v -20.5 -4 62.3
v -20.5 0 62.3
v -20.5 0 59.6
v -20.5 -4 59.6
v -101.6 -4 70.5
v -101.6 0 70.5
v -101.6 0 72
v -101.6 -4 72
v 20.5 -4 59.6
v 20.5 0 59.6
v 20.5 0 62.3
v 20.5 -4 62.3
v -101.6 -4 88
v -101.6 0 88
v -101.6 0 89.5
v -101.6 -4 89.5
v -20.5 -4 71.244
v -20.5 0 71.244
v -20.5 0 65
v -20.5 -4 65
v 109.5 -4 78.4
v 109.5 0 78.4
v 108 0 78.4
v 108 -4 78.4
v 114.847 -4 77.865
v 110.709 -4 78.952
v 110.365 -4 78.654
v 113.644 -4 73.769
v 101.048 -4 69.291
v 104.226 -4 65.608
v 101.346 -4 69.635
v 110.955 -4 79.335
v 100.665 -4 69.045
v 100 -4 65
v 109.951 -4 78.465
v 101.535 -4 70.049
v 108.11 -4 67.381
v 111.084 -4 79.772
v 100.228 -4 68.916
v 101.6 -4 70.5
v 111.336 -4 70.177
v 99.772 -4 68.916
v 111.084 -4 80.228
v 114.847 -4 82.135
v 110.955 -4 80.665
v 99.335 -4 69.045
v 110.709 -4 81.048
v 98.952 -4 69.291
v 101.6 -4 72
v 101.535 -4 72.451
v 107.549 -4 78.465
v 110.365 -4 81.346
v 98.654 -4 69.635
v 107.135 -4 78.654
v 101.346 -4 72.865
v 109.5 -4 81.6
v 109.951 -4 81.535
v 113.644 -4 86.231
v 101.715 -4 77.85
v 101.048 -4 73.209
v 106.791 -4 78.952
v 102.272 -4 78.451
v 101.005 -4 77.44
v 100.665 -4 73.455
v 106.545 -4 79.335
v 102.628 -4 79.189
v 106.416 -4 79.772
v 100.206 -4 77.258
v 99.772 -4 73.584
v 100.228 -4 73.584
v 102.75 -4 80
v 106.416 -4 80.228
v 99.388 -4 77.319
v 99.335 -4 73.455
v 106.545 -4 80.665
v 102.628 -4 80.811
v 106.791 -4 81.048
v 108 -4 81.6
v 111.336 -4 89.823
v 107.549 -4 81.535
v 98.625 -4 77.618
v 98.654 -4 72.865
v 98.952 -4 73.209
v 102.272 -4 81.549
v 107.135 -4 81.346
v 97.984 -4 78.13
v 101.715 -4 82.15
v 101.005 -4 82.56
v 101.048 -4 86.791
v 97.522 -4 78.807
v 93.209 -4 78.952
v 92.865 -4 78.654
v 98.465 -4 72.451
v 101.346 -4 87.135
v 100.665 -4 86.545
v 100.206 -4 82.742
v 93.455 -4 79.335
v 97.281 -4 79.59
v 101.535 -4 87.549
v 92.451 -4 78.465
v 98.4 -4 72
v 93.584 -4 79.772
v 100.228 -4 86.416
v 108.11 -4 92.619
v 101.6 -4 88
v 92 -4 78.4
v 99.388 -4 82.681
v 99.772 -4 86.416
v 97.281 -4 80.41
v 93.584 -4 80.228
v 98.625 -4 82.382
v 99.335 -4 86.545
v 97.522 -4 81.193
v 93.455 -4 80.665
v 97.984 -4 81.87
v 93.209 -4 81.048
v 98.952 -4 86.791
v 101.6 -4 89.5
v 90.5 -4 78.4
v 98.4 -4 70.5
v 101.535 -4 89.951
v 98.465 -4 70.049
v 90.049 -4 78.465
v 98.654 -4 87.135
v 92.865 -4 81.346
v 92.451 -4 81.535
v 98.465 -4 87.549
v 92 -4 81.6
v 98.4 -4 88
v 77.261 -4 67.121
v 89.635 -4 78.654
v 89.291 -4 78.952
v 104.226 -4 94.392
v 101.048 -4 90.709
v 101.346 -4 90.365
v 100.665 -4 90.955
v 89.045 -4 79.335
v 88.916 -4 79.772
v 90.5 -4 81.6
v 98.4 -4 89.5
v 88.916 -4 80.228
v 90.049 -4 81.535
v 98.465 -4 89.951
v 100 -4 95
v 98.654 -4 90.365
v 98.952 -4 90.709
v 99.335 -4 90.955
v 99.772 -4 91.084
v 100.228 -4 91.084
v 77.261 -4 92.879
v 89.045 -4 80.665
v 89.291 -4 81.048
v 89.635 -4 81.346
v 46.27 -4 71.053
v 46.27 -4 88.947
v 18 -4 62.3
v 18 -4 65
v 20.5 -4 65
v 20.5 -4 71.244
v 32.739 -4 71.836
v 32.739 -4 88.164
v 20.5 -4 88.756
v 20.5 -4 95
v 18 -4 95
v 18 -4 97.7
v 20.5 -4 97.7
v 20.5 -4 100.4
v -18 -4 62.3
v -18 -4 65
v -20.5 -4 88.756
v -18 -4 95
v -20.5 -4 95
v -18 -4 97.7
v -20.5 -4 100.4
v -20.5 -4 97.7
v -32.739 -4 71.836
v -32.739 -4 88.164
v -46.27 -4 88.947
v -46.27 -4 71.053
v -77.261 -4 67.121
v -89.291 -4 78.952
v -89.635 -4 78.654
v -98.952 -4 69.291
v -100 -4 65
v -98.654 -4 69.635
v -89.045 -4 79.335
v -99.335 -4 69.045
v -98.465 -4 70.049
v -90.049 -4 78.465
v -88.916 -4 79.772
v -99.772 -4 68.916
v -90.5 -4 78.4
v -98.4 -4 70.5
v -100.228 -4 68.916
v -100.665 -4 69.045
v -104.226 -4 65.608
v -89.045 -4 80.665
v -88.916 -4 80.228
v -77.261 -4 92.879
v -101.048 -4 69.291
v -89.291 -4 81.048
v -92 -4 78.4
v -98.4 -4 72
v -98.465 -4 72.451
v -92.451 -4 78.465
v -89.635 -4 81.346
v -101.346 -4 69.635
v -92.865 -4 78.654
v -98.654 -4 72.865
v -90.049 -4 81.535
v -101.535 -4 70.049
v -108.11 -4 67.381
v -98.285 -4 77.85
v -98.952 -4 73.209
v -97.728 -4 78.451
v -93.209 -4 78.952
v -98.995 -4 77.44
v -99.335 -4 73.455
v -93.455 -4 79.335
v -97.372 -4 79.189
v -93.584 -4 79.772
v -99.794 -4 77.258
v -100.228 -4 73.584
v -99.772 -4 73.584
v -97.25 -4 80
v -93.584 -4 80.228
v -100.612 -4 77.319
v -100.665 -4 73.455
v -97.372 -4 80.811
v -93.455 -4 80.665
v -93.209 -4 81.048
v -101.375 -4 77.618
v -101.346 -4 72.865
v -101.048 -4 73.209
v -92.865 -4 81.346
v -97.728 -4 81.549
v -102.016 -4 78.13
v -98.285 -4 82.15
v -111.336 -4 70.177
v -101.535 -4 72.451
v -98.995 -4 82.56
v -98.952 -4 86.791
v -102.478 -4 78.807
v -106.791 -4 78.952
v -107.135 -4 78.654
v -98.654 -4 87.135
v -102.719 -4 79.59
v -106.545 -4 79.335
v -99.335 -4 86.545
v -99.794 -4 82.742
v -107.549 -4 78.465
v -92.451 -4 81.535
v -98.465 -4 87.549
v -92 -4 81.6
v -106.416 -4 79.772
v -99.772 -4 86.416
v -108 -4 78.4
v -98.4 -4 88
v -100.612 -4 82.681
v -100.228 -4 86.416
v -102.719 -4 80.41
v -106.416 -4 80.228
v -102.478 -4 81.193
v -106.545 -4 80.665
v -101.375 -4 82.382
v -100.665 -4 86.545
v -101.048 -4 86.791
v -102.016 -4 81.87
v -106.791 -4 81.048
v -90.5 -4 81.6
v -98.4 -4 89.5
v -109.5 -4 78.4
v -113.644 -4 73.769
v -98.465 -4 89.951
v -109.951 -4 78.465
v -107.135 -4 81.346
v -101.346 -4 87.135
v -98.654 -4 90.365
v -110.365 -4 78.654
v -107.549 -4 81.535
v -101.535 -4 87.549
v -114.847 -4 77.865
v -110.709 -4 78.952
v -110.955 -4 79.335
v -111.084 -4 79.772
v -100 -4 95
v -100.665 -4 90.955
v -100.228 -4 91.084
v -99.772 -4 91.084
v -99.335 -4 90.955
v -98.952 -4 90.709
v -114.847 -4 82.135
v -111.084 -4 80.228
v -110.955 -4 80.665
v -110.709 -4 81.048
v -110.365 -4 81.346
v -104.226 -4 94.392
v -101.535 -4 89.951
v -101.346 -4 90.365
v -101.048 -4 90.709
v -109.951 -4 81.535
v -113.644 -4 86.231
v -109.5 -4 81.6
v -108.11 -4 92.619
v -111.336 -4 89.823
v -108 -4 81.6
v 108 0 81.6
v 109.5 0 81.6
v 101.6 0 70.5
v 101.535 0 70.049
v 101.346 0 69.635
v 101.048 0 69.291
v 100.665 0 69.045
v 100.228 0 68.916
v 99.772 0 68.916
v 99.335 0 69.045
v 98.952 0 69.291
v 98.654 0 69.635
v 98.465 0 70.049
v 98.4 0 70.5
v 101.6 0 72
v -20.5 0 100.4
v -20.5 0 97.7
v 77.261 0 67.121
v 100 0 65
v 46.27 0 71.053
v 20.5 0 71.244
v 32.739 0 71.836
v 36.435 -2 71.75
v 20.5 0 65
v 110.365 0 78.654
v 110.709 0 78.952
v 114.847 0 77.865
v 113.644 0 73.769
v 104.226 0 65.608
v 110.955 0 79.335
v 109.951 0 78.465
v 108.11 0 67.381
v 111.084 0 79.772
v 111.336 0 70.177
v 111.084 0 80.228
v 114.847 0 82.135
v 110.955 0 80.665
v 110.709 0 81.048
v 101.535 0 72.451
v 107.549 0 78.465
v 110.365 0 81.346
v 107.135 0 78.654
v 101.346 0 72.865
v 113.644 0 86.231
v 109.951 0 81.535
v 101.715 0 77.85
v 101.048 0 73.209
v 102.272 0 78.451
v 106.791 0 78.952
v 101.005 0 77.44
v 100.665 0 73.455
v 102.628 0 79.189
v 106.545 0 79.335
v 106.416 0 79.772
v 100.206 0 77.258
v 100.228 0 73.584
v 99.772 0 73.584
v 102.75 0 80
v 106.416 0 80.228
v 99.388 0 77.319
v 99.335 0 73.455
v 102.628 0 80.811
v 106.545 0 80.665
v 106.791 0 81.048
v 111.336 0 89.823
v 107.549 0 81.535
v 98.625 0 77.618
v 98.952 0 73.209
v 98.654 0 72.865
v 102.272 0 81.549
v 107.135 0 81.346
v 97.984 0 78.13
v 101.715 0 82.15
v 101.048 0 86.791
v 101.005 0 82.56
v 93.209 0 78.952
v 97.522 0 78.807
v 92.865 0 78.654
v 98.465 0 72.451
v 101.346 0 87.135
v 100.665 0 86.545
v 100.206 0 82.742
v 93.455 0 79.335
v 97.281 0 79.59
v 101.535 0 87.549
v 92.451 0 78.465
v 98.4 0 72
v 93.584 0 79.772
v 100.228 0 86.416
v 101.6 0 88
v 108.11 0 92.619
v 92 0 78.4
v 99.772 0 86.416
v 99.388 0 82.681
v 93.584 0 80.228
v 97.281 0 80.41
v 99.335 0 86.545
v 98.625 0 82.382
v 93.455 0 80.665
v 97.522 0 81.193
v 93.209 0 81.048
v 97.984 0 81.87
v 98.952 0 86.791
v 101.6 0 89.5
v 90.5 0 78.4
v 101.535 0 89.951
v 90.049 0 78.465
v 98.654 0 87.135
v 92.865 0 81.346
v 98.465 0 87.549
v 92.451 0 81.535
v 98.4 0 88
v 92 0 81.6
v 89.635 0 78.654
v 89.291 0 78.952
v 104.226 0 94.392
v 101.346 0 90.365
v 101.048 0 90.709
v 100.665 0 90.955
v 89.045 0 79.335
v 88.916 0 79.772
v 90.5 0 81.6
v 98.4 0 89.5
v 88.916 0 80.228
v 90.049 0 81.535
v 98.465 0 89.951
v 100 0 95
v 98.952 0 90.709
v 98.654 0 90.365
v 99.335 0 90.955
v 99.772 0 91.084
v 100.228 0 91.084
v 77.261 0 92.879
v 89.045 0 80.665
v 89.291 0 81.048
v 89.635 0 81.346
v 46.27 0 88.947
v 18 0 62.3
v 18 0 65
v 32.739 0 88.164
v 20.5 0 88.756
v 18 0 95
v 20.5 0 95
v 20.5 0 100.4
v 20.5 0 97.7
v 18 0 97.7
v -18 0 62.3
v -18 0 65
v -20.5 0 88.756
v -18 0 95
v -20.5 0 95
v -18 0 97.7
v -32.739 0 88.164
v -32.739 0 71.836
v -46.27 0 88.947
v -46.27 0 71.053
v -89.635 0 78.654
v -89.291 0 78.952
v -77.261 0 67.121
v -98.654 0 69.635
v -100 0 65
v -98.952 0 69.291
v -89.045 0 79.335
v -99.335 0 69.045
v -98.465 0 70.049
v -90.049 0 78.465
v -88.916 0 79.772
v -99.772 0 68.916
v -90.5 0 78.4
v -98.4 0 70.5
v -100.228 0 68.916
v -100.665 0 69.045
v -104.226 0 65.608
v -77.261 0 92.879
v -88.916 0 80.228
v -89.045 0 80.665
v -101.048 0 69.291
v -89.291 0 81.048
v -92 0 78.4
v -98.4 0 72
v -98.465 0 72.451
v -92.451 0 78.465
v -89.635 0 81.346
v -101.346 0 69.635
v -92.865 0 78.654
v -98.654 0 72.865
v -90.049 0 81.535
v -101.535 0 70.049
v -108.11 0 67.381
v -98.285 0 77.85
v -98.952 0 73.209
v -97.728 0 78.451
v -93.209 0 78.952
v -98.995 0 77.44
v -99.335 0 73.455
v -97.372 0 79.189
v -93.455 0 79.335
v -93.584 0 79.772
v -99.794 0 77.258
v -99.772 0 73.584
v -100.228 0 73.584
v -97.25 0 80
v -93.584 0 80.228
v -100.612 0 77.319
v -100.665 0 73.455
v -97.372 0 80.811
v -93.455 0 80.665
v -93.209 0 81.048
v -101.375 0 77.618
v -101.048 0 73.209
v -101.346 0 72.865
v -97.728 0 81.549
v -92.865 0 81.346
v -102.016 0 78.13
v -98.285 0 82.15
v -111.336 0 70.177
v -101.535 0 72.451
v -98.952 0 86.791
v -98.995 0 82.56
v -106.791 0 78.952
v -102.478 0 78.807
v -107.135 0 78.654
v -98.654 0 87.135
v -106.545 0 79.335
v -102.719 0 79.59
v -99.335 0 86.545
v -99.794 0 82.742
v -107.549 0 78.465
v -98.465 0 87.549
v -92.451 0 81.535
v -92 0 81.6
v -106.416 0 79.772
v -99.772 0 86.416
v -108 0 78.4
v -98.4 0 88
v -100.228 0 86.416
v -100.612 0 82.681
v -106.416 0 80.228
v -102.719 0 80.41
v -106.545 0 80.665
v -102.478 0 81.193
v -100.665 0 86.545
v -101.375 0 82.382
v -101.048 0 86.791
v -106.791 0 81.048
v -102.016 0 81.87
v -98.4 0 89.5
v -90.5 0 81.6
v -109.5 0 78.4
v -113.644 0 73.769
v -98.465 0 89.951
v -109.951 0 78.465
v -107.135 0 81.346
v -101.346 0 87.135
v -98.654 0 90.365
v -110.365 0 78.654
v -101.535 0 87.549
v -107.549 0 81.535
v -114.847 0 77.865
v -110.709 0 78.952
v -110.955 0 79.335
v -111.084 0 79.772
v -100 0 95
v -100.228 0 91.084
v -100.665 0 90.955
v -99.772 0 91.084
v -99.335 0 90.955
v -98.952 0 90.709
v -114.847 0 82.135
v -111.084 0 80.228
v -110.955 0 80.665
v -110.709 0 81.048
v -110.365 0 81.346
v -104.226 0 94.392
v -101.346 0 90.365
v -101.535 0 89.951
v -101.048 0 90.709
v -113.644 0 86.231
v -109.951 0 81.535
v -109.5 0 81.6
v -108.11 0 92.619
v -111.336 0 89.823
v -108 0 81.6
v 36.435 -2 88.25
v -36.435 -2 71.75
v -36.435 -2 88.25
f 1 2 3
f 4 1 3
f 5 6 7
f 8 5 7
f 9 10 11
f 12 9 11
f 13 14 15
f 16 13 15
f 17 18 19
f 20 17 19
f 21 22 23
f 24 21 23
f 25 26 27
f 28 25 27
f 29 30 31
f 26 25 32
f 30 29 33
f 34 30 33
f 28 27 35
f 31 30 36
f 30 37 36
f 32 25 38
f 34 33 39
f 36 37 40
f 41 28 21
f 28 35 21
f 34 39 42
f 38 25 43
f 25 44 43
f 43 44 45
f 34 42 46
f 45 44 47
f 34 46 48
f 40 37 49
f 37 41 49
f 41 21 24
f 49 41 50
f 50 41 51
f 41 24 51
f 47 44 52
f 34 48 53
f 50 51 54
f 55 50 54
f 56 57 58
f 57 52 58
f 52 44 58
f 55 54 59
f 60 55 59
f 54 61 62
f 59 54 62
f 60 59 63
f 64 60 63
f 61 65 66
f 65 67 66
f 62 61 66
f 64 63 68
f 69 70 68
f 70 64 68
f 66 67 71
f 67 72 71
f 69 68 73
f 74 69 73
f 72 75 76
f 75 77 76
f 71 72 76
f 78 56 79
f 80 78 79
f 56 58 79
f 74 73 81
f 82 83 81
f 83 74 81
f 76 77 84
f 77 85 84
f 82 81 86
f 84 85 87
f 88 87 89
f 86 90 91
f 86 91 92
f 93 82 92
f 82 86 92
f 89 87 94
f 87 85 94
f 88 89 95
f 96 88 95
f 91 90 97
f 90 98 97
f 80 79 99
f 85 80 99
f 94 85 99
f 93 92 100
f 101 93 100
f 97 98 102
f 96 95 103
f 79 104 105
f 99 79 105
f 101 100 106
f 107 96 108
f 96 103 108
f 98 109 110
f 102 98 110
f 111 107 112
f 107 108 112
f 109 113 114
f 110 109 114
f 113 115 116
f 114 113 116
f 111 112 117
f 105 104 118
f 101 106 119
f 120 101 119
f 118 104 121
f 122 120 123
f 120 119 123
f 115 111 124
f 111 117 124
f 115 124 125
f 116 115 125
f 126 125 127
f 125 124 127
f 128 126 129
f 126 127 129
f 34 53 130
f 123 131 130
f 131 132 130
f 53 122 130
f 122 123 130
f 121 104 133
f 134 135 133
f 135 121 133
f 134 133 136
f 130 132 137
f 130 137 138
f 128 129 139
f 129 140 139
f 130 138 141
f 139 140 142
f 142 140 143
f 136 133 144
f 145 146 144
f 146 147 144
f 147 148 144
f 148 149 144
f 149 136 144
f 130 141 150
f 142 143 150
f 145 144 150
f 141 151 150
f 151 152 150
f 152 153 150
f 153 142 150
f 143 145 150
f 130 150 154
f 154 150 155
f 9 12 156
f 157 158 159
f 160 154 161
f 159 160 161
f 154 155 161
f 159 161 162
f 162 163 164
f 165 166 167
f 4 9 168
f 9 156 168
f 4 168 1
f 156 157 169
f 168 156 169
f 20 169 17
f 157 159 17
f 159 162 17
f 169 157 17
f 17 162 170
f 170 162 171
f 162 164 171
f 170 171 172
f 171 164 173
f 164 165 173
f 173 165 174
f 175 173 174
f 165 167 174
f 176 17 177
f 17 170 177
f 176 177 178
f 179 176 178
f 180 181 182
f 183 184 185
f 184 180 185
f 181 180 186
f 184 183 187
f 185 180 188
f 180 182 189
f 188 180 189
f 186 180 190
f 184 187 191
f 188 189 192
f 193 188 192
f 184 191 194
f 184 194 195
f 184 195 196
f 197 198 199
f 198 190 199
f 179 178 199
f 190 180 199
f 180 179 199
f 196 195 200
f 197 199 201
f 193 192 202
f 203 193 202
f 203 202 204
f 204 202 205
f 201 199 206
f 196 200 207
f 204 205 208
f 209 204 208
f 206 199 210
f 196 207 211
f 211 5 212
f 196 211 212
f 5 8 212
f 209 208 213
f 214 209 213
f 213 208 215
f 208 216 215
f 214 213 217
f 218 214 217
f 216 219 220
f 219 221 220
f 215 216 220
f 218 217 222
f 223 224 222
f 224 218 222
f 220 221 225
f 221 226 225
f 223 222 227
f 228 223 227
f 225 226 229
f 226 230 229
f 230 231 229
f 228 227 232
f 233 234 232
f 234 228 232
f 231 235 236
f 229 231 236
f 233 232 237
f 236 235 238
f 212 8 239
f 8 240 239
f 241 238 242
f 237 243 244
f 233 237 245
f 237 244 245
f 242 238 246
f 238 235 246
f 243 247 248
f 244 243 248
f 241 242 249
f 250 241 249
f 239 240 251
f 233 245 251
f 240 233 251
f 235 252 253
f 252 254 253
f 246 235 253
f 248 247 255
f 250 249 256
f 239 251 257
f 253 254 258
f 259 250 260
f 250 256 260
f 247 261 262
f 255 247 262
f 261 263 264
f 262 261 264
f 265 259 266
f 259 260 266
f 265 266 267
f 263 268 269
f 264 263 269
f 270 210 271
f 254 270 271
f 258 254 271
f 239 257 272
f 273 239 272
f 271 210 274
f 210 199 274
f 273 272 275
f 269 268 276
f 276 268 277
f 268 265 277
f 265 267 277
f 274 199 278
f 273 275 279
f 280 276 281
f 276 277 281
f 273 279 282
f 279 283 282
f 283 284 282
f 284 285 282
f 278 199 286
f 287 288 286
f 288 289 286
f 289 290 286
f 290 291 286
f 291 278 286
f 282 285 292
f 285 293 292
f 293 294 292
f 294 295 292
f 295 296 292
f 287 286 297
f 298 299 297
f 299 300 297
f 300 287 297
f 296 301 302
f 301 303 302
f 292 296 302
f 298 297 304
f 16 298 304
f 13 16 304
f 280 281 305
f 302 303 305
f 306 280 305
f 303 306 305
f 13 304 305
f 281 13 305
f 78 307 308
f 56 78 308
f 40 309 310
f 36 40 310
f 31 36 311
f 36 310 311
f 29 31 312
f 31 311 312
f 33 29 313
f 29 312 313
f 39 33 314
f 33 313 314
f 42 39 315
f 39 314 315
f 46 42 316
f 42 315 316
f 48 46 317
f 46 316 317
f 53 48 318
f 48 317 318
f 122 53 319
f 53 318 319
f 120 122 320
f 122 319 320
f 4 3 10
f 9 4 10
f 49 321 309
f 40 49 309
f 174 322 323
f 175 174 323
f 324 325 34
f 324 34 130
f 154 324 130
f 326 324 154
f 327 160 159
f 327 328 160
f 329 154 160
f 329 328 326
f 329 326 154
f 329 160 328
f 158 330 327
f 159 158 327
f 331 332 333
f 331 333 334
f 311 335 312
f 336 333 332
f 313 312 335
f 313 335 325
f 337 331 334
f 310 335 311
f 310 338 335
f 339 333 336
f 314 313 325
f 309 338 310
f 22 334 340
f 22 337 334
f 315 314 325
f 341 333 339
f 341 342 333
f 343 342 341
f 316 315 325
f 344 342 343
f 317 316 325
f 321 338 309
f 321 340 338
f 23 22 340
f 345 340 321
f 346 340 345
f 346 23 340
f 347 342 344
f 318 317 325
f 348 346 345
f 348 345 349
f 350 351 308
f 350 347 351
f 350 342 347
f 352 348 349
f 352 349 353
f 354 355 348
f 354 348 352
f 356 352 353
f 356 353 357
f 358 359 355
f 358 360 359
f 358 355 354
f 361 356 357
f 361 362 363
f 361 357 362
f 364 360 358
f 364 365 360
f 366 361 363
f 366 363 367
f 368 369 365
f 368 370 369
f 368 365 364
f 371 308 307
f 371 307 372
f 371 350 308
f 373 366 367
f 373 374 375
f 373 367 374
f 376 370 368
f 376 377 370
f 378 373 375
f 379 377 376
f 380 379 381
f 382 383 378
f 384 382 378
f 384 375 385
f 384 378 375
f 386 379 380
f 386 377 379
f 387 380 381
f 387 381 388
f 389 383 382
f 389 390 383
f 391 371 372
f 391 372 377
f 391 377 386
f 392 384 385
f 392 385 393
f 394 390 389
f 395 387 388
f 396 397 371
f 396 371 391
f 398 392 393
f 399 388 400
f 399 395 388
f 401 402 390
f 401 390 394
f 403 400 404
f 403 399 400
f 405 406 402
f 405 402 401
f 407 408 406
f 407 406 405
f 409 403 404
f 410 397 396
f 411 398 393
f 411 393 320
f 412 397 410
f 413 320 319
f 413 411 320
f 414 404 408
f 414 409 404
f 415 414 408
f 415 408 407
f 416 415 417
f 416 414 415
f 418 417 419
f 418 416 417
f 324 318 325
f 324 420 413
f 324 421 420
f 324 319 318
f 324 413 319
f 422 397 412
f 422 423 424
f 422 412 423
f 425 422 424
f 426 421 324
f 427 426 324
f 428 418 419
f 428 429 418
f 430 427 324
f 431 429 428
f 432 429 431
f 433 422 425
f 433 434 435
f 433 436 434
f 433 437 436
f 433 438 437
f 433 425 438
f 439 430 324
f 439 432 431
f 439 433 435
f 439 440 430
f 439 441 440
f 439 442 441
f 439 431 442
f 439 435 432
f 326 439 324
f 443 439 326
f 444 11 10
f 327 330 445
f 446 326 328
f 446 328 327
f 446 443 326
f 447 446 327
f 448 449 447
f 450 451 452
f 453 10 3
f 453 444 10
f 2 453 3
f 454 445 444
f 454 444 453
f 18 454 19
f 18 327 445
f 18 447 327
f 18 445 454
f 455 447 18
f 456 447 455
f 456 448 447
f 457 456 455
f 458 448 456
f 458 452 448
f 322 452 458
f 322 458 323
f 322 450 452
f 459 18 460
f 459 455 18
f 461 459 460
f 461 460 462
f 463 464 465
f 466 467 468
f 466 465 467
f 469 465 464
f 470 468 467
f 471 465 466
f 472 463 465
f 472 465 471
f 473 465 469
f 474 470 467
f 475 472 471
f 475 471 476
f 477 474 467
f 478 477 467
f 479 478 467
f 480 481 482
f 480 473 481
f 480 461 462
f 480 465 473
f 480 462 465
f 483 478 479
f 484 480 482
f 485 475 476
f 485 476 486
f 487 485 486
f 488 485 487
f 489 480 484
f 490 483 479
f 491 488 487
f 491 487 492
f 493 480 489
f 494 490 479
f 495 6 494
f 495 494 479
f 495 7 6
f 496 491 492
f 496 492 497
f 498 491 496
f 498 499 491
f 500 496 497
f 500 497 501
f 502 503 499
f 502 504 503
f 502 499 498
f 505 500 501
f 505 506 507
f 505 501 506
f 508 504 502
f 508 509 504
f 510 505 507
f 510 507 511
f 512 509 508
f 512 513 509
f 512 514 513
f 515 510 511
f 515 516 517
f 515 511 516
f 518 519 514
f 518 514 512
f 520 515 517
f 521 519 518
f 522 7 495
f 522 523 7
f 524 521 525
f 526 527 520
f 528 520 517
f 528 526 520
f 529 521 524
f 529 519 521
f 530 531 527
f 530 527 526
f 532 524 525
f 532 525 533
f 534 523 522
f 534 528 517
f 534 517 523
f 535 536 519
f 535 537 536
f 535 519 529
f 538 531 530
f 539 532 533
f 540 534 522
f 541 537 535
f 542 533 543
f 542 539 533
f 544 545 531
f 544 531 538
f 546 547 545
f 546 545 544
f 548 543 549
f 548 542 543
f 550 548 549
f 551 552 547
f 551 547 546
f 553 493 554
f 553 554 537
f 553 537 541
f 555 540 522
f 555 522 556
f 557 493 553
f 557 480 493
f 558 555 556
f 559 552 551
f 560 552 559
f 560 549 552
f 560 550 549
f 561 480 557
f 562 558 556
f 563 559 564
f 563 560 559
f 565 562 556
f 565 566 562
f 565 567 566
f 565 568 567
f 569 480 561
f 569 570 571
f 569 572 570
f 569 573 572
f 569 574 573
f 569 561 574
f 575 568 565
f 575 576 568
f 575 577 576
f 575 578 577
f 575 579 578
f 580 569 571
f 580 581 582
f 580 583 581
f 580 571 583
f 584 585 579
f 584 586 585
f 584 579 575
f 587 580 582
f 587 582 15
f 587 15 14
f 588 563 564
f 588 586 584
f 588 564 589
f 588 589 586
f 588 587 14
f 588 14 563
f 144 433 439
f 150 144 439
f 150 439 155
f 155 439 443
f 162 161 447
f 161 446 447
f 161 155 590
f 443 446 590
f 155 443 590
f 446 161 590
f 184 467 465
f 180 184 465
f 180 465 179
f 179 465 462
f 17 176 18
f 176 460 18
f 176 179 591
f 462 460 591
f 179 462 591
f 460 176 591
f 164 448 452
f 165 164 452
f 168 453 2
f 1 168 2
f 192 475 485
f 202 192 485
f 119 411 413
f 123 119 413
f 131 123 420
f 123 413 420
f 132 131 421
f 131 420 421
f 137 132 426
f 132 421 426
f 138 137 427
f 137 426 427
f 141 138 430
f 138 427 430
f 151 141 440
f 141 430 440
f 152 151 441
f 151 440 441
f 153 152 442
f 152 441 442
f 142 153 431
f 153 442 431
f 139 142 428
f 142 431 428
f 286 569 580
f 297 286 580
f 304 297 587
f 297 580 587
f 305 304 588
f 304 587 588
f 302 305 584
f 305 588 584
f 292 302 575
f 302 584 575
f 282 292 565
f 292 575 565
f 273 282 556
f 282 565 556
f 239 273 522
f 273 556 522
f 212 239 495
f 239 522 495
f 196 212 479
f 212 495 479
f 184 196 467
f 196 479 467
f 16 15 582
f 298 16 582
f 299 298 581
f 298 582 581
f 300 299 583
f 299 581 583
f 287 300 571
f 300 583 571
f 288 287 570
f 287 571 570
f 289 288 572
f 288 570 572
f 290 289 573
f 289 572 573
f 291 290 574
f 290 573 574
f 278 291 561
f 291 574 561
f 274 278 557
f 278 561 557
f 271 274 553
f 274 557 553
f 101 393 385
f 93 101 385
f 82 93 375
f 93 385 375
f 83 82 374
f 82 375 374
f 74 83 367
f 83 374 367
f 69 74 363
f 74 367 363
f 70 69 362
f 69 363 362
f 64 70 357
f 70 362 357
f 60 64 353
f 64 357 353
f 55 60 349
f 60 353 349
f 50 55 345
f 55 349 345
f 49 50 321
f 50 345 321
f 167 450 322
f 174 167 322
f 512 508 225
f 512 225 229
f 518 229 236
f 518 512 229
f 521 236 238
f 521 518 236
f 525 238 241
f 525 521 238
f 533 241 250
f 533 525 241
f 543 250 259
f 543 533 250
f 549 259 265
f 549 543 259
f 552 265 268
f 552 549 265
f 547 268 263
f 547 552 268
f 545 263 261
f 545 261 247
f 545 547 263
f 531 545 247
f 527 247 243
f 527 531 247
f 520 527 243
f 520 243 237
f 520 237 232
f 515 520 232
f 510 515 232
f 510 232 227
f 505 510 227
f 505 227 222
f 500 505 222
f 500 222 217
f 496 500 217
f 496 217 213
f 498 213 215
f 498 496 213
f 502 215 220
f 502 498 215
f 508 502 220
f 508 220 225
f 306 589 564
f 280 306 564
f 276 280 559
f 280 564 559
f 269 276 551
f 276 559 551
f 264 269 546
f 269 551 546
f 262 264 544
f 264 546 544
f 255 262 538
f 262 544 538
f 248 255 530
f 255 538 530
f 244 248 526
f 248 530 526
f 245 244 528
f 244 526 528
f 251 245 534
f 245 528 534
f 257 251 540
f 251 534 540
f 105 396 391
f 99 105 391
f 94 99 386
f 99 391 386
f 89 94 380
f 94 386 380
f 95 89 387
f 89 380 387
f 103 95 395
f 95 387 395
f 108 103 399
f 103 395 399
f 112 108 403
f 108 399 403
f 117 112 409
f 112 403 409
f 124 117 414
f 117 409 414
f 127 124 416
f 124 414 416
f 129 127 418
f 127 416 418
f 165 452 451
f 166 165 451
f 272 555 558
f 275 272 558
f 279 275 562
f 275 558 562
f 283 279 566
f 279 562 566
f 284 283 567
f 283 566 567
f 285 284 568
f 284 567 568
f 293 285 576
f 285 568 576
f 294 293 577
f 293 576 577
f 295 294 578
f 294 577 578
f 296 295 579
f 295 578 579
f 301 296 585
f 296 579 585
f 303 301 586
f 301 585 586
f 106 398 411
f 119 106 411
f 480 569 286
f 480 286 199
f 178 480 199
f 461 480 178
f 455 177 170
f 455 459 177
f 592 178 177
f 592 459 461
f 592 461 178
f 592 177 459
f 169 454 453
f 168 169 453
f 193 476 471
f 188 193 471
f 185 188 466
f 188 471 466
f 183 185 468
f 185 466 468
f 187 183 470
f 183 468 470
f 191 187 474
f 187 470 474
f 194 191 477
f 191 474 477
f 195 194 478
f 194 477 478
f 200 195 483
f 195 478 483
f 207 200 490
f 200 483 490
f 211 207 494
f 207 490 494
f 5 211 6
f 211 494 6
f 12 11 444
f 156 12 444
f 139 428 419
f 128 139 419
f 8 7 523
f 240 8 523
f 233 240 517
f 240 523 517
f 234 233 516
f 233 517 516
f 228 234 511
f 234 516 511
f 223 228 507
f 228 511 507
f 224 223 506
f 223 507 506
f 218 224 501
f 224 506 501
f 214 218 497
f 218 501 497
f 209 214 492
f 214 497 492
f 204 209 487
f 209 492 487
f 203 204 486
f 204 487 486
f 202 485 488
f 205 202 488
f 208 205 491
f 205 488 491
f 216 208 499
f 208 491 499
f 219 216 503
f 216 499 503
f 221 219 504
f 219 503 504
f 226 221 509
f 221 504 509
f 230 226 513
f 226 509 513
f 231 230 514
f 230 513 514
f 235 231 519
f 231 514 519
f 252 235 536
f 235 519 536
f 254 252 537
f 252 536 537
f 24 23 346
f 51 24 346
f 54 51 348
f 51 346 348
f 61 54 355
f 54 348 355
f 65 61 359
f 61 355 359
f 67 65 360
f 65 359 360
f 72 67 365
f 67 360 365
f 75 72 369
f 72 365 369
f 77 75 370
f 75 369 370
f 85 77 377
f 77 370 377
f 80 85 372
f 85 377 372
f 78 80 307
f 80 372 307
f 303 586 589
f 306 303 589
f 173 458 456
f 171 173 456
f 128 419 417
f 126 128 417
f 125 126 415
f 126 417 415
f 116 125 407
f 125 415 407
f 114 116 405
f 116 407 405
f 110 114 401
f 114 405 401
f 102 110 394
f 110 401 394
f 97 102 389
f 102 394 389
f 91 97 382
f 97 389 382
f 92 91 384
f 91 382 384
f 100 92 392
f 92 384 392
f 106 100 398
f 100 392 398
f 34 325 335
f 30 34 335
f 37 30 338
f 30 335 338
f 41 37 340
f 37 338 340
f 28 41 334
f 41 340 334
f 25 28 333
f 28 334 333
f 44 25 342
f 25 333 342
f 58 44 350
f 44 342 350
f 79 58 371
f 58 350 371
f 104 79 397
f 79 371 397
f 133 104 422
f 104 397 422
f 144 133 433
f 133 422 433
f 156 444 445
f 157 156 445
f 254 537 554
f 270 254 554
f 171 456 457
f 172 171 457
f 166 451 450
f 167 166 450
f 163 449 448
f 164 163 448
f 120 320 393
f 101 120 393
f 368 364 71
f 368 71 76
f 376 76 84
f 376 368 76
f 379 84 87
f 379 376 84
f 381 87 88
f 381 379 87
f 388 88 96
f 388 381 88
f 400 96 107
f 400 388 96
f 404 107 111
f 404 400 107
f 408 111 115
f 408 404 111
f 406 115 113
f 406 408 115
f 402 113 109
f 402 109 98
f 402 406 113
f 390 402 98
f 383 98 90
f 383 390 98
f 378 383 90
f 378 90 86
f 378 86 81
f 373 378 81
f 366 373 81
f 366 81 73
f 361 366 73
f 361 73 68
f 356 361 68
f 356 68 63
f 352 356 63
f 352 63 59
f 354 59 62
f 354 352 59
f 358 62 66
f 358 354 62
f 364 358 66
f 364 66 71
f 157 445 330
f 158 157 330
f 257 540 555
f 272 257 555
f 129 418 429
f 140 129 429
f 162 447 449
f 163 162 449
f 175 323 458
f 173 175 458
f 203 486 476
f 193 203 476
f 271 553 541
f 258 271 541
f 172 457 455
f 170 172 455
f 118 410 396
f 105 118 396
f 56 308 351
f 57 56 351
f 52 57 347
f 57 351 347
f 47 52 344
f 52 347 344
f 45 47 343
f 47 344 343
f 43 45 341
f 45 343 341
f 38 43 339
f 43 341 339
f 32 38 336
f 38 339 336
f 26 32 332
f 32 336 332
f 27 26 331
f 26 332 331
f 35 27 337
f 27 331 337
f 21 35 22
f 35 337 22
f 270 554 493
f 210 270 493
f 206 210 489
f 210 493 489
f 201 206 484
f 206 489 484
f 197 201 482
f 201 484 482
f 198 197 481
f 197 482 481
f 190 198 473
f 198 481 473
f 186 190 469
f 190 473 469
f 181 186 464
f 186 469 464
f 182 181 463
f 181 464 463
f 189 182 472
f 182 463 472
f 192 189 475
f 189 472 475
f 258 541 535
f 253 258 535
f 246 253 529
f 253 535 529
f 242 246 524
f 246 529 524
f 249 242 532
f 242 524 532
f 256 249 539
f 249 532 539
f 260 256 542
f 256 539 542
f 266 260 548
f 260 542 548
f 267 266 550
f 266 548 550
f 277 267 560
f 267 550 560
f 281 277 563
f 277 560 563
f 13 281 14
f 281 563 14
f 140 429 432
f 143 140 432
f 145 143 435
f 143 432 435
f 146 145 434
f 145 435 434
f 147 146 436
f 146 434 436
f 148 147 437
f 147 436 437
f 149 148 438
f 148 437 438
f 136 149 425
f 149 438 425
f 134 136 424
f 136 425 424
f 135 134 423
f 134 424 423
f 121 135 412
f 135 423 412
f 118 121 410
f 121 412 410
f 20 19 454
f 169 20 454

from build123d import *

# Parameters (mm, degrees)
F0_R     = 2.75
F1_DEPTH = 4


with BuildPart() as f1:
    # F0 (on Front) → F1 (new body)
    with BuildSketch(Plane.XZ):
        with BuildLine():
            add(Edge.make_bspline(
                [(-100, 95), (-81.2941622631, 94.4236036805), (-47.5910411734, 87.3203708431), (-25.3869639524, 88.2401502703), (-20.5, 88.75608063)],
                knots=[0, 0, 0, 0, 0.5689678783, 0.7432926029, 0.7432926029, 0.7432926029, 0.7432926029], degree=3))
            ThreePointArc((-100, 95), (-115, 80), (-100, 65))
            add(Edge.make_bspline(
                [(-100, 65), (-81.2941622631, 65.5763963195), (-47.5910411734, 72.6796291569), (-25.3869639524, 71.7598497297), (-20.5, 71.24391937)],
                knots=[0, 0, 0, 0, 0.5689678783, 0.7432926029, 0.7432926029, 0.7432926029, 0.7432926029], degree=3))
            add(Edge.make_bspline(
                [(-20.5, 71.24391937), (-19.6576755147, 71.1549928343), (-18.8248746074, 71.0571473907), (-18, 70.9511054936)],
                knots=[0.7432926029, 0.7432926029, 0.7432926029, 0.7432926029, 0.7733394757, 0.7733394757, 0.7733394757, 0.7733394757], degree=3))
            add(Edge.make_bspline(
                [(-18, 70.9511054936), (-11.7775051442, 70.1511715966), (-6.006059288, 68.884815508), (0, 67.4621646617)],
                knots=[0.7733394757, 0.7733394757, 0.7733394757, 0.7733394757, 1, 1, 1, 1], degree=3))
            add(Edge.make_bspline(
                [(18, 70.9511054936), (11.7775051442, 70.1511715966), (6.006059288, 68.884815508), (0, 67.4621646617)],
                knots=[0.7733394757, 0.7733394757, 0.7733394757, 0.7733394757, 1, 1, 1, 1], degree=3))
            add(Edge.make_bspline(
                [(20.5, 71.24391937), (19.6576755147, 71.1549928343), (18.8248746074, 71.0571473907), (18, 70.9511054936)],
                knots=[0.7432926029, 0.7432926029, 0.7432926029, 0.7432926029, 0.7733394757, 0.7733394757, 0.7733394757, 0.7733394757], degree=3))
            add(Edge.make_bspline(
                [(100, 65), (81.2941622631, 65.5763963195), (47.5910411734, 72.6796291569), (25.3869639524, 71.7598497297), (20.5, 71.24391937)],
                knots=[0, 0, 0, 0, 0.5689678783, 0.7432926029, 0.7432926029, 0.7432926029, 0.7432926029], degree=3))
            ThreePointArc((100, 65), (115, 80), (100, 95))
            add(Edge.make_bspline(
                [(100, 95), (81.2941622631, 94.4236036805), (47.5910411734, 87.3203708431), (25.3869639524, 88.2401502703), (20.5, 88.75608063)],
                knots=[0, 0, 0, 0, 0.5689678783, 0.7432926029, 0.7432926029, 0.7432926029, 0.7432926029], degree=3))
            add(Edge.make_bspline(
                [(20.5, 88.75608063), (19.6576755147, 88.8450071657), (18.8248746074, 88.9428526093), (18, 89.0488945064)],
                knots=[0.7432926029, 0.7432926029, 0.7432926029, 0.7432926029, 0.7733394757, 0.7733394757, 0.7733394757, 0.7733394757], degree=3))
            add(Edge.make_bspline(
                [(18, 89.0488945064), (11.7775051442, 89.8488284034), (6.006059288, 91.115184492), (0, 92.5378353383)],
                knots=[0.7733394757, 0.7733394757, 0.7733394757, 0.7733394757, 1, 1, 1, 1], degree=3))
            add(Edge.make_bspline(
                [(-18, 89.0488945064), (-11.7775051442, 89.8488284034), (-6.006059288, 91.115184492), (0, 92.5378353383)],
                knots=[0.7733394757, 0.7733394757, 0.7733394757, 0.7733394757, 1, 1, 1, 1], degree=3))
            add(Edge.make_bspline(
                [(-20.5, 88.75608063), (-19.6576755147, 88.8450071657), (-18.8248746074, 88.9428526093), (-18, 89.0488945064)],
                knots=[0.7432926029, 0.7432926029, 0.7432926029, 0.7432926029, 0.7733394757, 0.7733394757, 0.7733394757, 0.7733394757], degree=3))
        make_face()
        with BuildLine():
            Line((-98.4, 72), (-98.4, 70.5))
            ThreePointArc((-98.4, 70.5), (-100, 68.9), (-101.6, 70.5))
            Line((-101.6, 70.5), (-101.6, 72))
            ThreePointArc((-101.6, 72), (-100, 73.6), (-98.4, 72))
        make_face(mode=Mode.SUBTRACT)
        with BuildLine():
            ThreePointArc((-109.5, 78.4), (-111.1, 80), (-109.5, 81.6))
            Line((-109.5, 81.6), (-108, 81.6))
            ThreePointArc((-108, 81.6), (-106.4, 80), (-108, 78.4))
            Line((-108, 78.4), (-109.5, 78.4))
        make_face(mode=Mode.SUBTRACT)
        with Locations((-100, 80)):
            Circle(F0_R, mode=Mode.SUBTRACT)
        with BuildLine():
            Line((-90.5, 78.4), (-92, 78.4))
            ThreePointArc((-92, 78.4), (-93.6, 80), (-92, 81.6))
            Line((-92, 81.6), (-90.5, 81.6))
            ThreePointArc((-90.5, 81.6), (-88.9, 80), (-90.5, 78.4))
        make_face(mode=Mode.SUBTRACT)
        with BuildLine():
            Line((101.6, 72), (101.6, 70.5))
            ThreePointArc((101.6, 70.5), (100, 68.9), (98.4, 70.5))
            Line((98.4, 70.5), (98.4, 72))
            ThreePointArc((98.4, 72), (100, 73.6), (101.6, 72))
        make_face(mode=Mode.SUBTRACT)
        with BuildLine():
            ThreePointArc((90.5, 78.4), (88.9, 80), (90.5, 81.6))
            Line((90.5, 81.6), (92, 81.6))
            ThreePointArc((92, 81.6), (93.6, 80), (92, 78.4))
            Line((92, 78.4), (90.5, 78.4))
        make_face(mode=Mode.SUBTRACT)
        with Locations((100, 80)):
            Circle(F0_R, mode=Mode.SUBTRACT)
        with BuildLine():
            Line((109.5, 78.4), (108, 78.4))
            ThreePointArc((108, 78.4), (106.4, 80), (108, 81.6))
            Line((108, 81.6), (109.5, 81.6))
            ThreePointArc((109.5, 81.6), (111.1, 80), (109.5, 78.4))
        make_face(mode=Mode.SUBTRACT)
        with BuildLine():
            ThreePointArc((-101.6, 89.5), (-100, 91.1), (-98.4, 89.5))
            Line((-98.4, 89.5), (-98.4, 88))
            ThreePointArc((-98.4, 88), (-100, 86.4), (-101.6, 88))
            Line((-101.6, 88), (-101.6, 89.5))
        make_face(mode=Mode.SUBTRACT)
        with BuildLine():
            Line((98.4, 88), (98.4, 89.5))
            ThreePointArc((98.4, 89.5), (100, 91.1), (101.6, 89.5))
            Line((101.6, 89.5), (101.6, 88))
            ThreePointArc((101.6, 88), (100, 86.4), (98.4, 88))
        make_face(mode=Mode.SUBTRACT)
        with BuildLine():
            Line((-20.5, 95), (-20.5, 88.75608063))
            add(Edge.make_bspline(
                [(-20.5, 88.75608063), (-19.6576755147, 88.8450071657), (-18.8248746074, 88.9428526093), (-18, 89.0488945064)],
                knots=[0.7432926029, 0.7432926029, 0.7432926029, 0.7432926029, 0.7733394757, 0.7733394757, 0.7733394757, 0.7733394757], degree=3))
            Line((-18, 89.0488945064), (-18, 95))
            Line((-18, 95), (-20.5, 95))
        make_face()
        with BuildLine():
            add(Edge.make_bspline(
                [(-20.5, 71.24391937), (-19.6576755147, 71.1549928343), (-18.8248746074, 71.0571473907), (-18, 70.9511054936)],
                knots=[0.7432926029, 0.7432926029, 0.7432926029, 0.7432926029, 0.7733394757, 0.7733394757, 0.7733394757, 0.7733394757], degree=3))
            Line((-20.5, 71.24391937), (-20.5, 65))
            Line((-20.5, 65), (-18, 65))
            Line((-18, 65), (-18, 70.9511054936))
        make_face()
        with BuildLine():
            Line((-18, 95), (-18, 89.0488945064))
            add(Edge.make_bspline(
                [(-18, 89.0488945064), (-11.7775051442, 89.8488284034), (-6.006059288, 91.115184492), (0, 92.5378353383)],
                knots=[0.7733394757, 0.7733394757, 0.7733394757, 0.7733394757, 1, 1, 1, 1], degree=3))
            add(Edge.make_bspline(
                [(18, 89.0488945064), (11.7775051442, 89.8488284034), (6.006059288, 91.115184492), (0, 92.5378353383)],
                knots=[0.7733394757, 0.7733394757, 0.7733394757, 0.7733394757, 1, 1, 1, 1], degree=3))
            Line((18, 89.0488945064), (18, 95))
            Line((18, 95), (18, 97.7))
            Line((18, 97.7), (20.5, 97.7))
            Line((20.5, 97.7), (20.5, 100.4))
            Line((20.5, 100.4), (-20.5, 100.4))
            Line((-20.5, 100.4), (-20.5, 97.7))
            Line((-20.5, 97.7), (-18, 97.7))
            Line((-18, 97.7), (-18, 95))
        make_face()
        with BuildLine():
            add(Edge.make_bspline(
                [(-18, 70.9511054936), (-11.7775051442, 70.1511715966), (-6.006059288, 68.884815508), (0, 67.4621646617)],
                knots=[0.7733394757, 0.7733394757, 0.7733394757, 0.7733394757, 1, 1, 1, 1], degree=3))
            Line((-18, 70.9511054936), (-18, 65))
            Line((-18, 65), (-18, 62.3))
            Line((-18, 62.3), (-20.5, 62.3))
            Line((-20.5, 62.3), (-20.5, 59.6))
            Line((-20.5, 59.6), (20.5, 59.6))
            Line((20.5, 59.6), (20.5, 62.3))
            Line((20.5, 62.3), (18, 62.3))
            Line((18, 62.3), (18, 65))
            Line((18, 65), (18, 70.9511054936))
            add(Edge.make_bspline(
                [(18, 70.9511054936), (11.7775051442, 70.1511715966), (6.006059288, 68.884815508), (0, 67.4621646617)],
                knots=[0.7733394757, 0.7733394757, 0.7733394757, 0.7733394757, 1, 1, 1, 1], degree=3))
        make_face()
        with BuildLine():
            Line((18, 95), (18, 89.0488945064))
            add(Edge.make_bspline(
                [(20.5, 88.75608063), (19.6576755147, 88.8450071657), (18.8248746074, 88.9428526093), (18, 89.0488945064)],
                knots=[0.7432926029, 0.7432926029, 0.7432926029, 0.7432926029, 0.7733394757, 0.7733394757, 0.7733394757, 0.7733394757], degree=3))
            Line((20.5, 88.75608063), (20.5, 95))
            Line((20.5, 95), (18, 95))
        make_face()
        with BuildLine():
            add(Edge.make_bspline(
                [(20.5, 71.24391937), (19.6576755147, 71.1549928343), (18.8248746074, 71.0571473907), (18, 70.9511054936)],
                knots=[0.7432926029, 0.7432926029, 0.7432926029, 0.7432926029, 0.7733394757, 0.7733394757, 0.7733394757, 0.7733394757], degree=3))
            Line((18, 70.9511054936), (18, 65))
            Line((18, 65), (20.5, 65))
            Line((20.5, 65), (20.5, 71.24391937))
        make_face()
    extrude(amount=F1_DEPTH)


solid = f1.part
